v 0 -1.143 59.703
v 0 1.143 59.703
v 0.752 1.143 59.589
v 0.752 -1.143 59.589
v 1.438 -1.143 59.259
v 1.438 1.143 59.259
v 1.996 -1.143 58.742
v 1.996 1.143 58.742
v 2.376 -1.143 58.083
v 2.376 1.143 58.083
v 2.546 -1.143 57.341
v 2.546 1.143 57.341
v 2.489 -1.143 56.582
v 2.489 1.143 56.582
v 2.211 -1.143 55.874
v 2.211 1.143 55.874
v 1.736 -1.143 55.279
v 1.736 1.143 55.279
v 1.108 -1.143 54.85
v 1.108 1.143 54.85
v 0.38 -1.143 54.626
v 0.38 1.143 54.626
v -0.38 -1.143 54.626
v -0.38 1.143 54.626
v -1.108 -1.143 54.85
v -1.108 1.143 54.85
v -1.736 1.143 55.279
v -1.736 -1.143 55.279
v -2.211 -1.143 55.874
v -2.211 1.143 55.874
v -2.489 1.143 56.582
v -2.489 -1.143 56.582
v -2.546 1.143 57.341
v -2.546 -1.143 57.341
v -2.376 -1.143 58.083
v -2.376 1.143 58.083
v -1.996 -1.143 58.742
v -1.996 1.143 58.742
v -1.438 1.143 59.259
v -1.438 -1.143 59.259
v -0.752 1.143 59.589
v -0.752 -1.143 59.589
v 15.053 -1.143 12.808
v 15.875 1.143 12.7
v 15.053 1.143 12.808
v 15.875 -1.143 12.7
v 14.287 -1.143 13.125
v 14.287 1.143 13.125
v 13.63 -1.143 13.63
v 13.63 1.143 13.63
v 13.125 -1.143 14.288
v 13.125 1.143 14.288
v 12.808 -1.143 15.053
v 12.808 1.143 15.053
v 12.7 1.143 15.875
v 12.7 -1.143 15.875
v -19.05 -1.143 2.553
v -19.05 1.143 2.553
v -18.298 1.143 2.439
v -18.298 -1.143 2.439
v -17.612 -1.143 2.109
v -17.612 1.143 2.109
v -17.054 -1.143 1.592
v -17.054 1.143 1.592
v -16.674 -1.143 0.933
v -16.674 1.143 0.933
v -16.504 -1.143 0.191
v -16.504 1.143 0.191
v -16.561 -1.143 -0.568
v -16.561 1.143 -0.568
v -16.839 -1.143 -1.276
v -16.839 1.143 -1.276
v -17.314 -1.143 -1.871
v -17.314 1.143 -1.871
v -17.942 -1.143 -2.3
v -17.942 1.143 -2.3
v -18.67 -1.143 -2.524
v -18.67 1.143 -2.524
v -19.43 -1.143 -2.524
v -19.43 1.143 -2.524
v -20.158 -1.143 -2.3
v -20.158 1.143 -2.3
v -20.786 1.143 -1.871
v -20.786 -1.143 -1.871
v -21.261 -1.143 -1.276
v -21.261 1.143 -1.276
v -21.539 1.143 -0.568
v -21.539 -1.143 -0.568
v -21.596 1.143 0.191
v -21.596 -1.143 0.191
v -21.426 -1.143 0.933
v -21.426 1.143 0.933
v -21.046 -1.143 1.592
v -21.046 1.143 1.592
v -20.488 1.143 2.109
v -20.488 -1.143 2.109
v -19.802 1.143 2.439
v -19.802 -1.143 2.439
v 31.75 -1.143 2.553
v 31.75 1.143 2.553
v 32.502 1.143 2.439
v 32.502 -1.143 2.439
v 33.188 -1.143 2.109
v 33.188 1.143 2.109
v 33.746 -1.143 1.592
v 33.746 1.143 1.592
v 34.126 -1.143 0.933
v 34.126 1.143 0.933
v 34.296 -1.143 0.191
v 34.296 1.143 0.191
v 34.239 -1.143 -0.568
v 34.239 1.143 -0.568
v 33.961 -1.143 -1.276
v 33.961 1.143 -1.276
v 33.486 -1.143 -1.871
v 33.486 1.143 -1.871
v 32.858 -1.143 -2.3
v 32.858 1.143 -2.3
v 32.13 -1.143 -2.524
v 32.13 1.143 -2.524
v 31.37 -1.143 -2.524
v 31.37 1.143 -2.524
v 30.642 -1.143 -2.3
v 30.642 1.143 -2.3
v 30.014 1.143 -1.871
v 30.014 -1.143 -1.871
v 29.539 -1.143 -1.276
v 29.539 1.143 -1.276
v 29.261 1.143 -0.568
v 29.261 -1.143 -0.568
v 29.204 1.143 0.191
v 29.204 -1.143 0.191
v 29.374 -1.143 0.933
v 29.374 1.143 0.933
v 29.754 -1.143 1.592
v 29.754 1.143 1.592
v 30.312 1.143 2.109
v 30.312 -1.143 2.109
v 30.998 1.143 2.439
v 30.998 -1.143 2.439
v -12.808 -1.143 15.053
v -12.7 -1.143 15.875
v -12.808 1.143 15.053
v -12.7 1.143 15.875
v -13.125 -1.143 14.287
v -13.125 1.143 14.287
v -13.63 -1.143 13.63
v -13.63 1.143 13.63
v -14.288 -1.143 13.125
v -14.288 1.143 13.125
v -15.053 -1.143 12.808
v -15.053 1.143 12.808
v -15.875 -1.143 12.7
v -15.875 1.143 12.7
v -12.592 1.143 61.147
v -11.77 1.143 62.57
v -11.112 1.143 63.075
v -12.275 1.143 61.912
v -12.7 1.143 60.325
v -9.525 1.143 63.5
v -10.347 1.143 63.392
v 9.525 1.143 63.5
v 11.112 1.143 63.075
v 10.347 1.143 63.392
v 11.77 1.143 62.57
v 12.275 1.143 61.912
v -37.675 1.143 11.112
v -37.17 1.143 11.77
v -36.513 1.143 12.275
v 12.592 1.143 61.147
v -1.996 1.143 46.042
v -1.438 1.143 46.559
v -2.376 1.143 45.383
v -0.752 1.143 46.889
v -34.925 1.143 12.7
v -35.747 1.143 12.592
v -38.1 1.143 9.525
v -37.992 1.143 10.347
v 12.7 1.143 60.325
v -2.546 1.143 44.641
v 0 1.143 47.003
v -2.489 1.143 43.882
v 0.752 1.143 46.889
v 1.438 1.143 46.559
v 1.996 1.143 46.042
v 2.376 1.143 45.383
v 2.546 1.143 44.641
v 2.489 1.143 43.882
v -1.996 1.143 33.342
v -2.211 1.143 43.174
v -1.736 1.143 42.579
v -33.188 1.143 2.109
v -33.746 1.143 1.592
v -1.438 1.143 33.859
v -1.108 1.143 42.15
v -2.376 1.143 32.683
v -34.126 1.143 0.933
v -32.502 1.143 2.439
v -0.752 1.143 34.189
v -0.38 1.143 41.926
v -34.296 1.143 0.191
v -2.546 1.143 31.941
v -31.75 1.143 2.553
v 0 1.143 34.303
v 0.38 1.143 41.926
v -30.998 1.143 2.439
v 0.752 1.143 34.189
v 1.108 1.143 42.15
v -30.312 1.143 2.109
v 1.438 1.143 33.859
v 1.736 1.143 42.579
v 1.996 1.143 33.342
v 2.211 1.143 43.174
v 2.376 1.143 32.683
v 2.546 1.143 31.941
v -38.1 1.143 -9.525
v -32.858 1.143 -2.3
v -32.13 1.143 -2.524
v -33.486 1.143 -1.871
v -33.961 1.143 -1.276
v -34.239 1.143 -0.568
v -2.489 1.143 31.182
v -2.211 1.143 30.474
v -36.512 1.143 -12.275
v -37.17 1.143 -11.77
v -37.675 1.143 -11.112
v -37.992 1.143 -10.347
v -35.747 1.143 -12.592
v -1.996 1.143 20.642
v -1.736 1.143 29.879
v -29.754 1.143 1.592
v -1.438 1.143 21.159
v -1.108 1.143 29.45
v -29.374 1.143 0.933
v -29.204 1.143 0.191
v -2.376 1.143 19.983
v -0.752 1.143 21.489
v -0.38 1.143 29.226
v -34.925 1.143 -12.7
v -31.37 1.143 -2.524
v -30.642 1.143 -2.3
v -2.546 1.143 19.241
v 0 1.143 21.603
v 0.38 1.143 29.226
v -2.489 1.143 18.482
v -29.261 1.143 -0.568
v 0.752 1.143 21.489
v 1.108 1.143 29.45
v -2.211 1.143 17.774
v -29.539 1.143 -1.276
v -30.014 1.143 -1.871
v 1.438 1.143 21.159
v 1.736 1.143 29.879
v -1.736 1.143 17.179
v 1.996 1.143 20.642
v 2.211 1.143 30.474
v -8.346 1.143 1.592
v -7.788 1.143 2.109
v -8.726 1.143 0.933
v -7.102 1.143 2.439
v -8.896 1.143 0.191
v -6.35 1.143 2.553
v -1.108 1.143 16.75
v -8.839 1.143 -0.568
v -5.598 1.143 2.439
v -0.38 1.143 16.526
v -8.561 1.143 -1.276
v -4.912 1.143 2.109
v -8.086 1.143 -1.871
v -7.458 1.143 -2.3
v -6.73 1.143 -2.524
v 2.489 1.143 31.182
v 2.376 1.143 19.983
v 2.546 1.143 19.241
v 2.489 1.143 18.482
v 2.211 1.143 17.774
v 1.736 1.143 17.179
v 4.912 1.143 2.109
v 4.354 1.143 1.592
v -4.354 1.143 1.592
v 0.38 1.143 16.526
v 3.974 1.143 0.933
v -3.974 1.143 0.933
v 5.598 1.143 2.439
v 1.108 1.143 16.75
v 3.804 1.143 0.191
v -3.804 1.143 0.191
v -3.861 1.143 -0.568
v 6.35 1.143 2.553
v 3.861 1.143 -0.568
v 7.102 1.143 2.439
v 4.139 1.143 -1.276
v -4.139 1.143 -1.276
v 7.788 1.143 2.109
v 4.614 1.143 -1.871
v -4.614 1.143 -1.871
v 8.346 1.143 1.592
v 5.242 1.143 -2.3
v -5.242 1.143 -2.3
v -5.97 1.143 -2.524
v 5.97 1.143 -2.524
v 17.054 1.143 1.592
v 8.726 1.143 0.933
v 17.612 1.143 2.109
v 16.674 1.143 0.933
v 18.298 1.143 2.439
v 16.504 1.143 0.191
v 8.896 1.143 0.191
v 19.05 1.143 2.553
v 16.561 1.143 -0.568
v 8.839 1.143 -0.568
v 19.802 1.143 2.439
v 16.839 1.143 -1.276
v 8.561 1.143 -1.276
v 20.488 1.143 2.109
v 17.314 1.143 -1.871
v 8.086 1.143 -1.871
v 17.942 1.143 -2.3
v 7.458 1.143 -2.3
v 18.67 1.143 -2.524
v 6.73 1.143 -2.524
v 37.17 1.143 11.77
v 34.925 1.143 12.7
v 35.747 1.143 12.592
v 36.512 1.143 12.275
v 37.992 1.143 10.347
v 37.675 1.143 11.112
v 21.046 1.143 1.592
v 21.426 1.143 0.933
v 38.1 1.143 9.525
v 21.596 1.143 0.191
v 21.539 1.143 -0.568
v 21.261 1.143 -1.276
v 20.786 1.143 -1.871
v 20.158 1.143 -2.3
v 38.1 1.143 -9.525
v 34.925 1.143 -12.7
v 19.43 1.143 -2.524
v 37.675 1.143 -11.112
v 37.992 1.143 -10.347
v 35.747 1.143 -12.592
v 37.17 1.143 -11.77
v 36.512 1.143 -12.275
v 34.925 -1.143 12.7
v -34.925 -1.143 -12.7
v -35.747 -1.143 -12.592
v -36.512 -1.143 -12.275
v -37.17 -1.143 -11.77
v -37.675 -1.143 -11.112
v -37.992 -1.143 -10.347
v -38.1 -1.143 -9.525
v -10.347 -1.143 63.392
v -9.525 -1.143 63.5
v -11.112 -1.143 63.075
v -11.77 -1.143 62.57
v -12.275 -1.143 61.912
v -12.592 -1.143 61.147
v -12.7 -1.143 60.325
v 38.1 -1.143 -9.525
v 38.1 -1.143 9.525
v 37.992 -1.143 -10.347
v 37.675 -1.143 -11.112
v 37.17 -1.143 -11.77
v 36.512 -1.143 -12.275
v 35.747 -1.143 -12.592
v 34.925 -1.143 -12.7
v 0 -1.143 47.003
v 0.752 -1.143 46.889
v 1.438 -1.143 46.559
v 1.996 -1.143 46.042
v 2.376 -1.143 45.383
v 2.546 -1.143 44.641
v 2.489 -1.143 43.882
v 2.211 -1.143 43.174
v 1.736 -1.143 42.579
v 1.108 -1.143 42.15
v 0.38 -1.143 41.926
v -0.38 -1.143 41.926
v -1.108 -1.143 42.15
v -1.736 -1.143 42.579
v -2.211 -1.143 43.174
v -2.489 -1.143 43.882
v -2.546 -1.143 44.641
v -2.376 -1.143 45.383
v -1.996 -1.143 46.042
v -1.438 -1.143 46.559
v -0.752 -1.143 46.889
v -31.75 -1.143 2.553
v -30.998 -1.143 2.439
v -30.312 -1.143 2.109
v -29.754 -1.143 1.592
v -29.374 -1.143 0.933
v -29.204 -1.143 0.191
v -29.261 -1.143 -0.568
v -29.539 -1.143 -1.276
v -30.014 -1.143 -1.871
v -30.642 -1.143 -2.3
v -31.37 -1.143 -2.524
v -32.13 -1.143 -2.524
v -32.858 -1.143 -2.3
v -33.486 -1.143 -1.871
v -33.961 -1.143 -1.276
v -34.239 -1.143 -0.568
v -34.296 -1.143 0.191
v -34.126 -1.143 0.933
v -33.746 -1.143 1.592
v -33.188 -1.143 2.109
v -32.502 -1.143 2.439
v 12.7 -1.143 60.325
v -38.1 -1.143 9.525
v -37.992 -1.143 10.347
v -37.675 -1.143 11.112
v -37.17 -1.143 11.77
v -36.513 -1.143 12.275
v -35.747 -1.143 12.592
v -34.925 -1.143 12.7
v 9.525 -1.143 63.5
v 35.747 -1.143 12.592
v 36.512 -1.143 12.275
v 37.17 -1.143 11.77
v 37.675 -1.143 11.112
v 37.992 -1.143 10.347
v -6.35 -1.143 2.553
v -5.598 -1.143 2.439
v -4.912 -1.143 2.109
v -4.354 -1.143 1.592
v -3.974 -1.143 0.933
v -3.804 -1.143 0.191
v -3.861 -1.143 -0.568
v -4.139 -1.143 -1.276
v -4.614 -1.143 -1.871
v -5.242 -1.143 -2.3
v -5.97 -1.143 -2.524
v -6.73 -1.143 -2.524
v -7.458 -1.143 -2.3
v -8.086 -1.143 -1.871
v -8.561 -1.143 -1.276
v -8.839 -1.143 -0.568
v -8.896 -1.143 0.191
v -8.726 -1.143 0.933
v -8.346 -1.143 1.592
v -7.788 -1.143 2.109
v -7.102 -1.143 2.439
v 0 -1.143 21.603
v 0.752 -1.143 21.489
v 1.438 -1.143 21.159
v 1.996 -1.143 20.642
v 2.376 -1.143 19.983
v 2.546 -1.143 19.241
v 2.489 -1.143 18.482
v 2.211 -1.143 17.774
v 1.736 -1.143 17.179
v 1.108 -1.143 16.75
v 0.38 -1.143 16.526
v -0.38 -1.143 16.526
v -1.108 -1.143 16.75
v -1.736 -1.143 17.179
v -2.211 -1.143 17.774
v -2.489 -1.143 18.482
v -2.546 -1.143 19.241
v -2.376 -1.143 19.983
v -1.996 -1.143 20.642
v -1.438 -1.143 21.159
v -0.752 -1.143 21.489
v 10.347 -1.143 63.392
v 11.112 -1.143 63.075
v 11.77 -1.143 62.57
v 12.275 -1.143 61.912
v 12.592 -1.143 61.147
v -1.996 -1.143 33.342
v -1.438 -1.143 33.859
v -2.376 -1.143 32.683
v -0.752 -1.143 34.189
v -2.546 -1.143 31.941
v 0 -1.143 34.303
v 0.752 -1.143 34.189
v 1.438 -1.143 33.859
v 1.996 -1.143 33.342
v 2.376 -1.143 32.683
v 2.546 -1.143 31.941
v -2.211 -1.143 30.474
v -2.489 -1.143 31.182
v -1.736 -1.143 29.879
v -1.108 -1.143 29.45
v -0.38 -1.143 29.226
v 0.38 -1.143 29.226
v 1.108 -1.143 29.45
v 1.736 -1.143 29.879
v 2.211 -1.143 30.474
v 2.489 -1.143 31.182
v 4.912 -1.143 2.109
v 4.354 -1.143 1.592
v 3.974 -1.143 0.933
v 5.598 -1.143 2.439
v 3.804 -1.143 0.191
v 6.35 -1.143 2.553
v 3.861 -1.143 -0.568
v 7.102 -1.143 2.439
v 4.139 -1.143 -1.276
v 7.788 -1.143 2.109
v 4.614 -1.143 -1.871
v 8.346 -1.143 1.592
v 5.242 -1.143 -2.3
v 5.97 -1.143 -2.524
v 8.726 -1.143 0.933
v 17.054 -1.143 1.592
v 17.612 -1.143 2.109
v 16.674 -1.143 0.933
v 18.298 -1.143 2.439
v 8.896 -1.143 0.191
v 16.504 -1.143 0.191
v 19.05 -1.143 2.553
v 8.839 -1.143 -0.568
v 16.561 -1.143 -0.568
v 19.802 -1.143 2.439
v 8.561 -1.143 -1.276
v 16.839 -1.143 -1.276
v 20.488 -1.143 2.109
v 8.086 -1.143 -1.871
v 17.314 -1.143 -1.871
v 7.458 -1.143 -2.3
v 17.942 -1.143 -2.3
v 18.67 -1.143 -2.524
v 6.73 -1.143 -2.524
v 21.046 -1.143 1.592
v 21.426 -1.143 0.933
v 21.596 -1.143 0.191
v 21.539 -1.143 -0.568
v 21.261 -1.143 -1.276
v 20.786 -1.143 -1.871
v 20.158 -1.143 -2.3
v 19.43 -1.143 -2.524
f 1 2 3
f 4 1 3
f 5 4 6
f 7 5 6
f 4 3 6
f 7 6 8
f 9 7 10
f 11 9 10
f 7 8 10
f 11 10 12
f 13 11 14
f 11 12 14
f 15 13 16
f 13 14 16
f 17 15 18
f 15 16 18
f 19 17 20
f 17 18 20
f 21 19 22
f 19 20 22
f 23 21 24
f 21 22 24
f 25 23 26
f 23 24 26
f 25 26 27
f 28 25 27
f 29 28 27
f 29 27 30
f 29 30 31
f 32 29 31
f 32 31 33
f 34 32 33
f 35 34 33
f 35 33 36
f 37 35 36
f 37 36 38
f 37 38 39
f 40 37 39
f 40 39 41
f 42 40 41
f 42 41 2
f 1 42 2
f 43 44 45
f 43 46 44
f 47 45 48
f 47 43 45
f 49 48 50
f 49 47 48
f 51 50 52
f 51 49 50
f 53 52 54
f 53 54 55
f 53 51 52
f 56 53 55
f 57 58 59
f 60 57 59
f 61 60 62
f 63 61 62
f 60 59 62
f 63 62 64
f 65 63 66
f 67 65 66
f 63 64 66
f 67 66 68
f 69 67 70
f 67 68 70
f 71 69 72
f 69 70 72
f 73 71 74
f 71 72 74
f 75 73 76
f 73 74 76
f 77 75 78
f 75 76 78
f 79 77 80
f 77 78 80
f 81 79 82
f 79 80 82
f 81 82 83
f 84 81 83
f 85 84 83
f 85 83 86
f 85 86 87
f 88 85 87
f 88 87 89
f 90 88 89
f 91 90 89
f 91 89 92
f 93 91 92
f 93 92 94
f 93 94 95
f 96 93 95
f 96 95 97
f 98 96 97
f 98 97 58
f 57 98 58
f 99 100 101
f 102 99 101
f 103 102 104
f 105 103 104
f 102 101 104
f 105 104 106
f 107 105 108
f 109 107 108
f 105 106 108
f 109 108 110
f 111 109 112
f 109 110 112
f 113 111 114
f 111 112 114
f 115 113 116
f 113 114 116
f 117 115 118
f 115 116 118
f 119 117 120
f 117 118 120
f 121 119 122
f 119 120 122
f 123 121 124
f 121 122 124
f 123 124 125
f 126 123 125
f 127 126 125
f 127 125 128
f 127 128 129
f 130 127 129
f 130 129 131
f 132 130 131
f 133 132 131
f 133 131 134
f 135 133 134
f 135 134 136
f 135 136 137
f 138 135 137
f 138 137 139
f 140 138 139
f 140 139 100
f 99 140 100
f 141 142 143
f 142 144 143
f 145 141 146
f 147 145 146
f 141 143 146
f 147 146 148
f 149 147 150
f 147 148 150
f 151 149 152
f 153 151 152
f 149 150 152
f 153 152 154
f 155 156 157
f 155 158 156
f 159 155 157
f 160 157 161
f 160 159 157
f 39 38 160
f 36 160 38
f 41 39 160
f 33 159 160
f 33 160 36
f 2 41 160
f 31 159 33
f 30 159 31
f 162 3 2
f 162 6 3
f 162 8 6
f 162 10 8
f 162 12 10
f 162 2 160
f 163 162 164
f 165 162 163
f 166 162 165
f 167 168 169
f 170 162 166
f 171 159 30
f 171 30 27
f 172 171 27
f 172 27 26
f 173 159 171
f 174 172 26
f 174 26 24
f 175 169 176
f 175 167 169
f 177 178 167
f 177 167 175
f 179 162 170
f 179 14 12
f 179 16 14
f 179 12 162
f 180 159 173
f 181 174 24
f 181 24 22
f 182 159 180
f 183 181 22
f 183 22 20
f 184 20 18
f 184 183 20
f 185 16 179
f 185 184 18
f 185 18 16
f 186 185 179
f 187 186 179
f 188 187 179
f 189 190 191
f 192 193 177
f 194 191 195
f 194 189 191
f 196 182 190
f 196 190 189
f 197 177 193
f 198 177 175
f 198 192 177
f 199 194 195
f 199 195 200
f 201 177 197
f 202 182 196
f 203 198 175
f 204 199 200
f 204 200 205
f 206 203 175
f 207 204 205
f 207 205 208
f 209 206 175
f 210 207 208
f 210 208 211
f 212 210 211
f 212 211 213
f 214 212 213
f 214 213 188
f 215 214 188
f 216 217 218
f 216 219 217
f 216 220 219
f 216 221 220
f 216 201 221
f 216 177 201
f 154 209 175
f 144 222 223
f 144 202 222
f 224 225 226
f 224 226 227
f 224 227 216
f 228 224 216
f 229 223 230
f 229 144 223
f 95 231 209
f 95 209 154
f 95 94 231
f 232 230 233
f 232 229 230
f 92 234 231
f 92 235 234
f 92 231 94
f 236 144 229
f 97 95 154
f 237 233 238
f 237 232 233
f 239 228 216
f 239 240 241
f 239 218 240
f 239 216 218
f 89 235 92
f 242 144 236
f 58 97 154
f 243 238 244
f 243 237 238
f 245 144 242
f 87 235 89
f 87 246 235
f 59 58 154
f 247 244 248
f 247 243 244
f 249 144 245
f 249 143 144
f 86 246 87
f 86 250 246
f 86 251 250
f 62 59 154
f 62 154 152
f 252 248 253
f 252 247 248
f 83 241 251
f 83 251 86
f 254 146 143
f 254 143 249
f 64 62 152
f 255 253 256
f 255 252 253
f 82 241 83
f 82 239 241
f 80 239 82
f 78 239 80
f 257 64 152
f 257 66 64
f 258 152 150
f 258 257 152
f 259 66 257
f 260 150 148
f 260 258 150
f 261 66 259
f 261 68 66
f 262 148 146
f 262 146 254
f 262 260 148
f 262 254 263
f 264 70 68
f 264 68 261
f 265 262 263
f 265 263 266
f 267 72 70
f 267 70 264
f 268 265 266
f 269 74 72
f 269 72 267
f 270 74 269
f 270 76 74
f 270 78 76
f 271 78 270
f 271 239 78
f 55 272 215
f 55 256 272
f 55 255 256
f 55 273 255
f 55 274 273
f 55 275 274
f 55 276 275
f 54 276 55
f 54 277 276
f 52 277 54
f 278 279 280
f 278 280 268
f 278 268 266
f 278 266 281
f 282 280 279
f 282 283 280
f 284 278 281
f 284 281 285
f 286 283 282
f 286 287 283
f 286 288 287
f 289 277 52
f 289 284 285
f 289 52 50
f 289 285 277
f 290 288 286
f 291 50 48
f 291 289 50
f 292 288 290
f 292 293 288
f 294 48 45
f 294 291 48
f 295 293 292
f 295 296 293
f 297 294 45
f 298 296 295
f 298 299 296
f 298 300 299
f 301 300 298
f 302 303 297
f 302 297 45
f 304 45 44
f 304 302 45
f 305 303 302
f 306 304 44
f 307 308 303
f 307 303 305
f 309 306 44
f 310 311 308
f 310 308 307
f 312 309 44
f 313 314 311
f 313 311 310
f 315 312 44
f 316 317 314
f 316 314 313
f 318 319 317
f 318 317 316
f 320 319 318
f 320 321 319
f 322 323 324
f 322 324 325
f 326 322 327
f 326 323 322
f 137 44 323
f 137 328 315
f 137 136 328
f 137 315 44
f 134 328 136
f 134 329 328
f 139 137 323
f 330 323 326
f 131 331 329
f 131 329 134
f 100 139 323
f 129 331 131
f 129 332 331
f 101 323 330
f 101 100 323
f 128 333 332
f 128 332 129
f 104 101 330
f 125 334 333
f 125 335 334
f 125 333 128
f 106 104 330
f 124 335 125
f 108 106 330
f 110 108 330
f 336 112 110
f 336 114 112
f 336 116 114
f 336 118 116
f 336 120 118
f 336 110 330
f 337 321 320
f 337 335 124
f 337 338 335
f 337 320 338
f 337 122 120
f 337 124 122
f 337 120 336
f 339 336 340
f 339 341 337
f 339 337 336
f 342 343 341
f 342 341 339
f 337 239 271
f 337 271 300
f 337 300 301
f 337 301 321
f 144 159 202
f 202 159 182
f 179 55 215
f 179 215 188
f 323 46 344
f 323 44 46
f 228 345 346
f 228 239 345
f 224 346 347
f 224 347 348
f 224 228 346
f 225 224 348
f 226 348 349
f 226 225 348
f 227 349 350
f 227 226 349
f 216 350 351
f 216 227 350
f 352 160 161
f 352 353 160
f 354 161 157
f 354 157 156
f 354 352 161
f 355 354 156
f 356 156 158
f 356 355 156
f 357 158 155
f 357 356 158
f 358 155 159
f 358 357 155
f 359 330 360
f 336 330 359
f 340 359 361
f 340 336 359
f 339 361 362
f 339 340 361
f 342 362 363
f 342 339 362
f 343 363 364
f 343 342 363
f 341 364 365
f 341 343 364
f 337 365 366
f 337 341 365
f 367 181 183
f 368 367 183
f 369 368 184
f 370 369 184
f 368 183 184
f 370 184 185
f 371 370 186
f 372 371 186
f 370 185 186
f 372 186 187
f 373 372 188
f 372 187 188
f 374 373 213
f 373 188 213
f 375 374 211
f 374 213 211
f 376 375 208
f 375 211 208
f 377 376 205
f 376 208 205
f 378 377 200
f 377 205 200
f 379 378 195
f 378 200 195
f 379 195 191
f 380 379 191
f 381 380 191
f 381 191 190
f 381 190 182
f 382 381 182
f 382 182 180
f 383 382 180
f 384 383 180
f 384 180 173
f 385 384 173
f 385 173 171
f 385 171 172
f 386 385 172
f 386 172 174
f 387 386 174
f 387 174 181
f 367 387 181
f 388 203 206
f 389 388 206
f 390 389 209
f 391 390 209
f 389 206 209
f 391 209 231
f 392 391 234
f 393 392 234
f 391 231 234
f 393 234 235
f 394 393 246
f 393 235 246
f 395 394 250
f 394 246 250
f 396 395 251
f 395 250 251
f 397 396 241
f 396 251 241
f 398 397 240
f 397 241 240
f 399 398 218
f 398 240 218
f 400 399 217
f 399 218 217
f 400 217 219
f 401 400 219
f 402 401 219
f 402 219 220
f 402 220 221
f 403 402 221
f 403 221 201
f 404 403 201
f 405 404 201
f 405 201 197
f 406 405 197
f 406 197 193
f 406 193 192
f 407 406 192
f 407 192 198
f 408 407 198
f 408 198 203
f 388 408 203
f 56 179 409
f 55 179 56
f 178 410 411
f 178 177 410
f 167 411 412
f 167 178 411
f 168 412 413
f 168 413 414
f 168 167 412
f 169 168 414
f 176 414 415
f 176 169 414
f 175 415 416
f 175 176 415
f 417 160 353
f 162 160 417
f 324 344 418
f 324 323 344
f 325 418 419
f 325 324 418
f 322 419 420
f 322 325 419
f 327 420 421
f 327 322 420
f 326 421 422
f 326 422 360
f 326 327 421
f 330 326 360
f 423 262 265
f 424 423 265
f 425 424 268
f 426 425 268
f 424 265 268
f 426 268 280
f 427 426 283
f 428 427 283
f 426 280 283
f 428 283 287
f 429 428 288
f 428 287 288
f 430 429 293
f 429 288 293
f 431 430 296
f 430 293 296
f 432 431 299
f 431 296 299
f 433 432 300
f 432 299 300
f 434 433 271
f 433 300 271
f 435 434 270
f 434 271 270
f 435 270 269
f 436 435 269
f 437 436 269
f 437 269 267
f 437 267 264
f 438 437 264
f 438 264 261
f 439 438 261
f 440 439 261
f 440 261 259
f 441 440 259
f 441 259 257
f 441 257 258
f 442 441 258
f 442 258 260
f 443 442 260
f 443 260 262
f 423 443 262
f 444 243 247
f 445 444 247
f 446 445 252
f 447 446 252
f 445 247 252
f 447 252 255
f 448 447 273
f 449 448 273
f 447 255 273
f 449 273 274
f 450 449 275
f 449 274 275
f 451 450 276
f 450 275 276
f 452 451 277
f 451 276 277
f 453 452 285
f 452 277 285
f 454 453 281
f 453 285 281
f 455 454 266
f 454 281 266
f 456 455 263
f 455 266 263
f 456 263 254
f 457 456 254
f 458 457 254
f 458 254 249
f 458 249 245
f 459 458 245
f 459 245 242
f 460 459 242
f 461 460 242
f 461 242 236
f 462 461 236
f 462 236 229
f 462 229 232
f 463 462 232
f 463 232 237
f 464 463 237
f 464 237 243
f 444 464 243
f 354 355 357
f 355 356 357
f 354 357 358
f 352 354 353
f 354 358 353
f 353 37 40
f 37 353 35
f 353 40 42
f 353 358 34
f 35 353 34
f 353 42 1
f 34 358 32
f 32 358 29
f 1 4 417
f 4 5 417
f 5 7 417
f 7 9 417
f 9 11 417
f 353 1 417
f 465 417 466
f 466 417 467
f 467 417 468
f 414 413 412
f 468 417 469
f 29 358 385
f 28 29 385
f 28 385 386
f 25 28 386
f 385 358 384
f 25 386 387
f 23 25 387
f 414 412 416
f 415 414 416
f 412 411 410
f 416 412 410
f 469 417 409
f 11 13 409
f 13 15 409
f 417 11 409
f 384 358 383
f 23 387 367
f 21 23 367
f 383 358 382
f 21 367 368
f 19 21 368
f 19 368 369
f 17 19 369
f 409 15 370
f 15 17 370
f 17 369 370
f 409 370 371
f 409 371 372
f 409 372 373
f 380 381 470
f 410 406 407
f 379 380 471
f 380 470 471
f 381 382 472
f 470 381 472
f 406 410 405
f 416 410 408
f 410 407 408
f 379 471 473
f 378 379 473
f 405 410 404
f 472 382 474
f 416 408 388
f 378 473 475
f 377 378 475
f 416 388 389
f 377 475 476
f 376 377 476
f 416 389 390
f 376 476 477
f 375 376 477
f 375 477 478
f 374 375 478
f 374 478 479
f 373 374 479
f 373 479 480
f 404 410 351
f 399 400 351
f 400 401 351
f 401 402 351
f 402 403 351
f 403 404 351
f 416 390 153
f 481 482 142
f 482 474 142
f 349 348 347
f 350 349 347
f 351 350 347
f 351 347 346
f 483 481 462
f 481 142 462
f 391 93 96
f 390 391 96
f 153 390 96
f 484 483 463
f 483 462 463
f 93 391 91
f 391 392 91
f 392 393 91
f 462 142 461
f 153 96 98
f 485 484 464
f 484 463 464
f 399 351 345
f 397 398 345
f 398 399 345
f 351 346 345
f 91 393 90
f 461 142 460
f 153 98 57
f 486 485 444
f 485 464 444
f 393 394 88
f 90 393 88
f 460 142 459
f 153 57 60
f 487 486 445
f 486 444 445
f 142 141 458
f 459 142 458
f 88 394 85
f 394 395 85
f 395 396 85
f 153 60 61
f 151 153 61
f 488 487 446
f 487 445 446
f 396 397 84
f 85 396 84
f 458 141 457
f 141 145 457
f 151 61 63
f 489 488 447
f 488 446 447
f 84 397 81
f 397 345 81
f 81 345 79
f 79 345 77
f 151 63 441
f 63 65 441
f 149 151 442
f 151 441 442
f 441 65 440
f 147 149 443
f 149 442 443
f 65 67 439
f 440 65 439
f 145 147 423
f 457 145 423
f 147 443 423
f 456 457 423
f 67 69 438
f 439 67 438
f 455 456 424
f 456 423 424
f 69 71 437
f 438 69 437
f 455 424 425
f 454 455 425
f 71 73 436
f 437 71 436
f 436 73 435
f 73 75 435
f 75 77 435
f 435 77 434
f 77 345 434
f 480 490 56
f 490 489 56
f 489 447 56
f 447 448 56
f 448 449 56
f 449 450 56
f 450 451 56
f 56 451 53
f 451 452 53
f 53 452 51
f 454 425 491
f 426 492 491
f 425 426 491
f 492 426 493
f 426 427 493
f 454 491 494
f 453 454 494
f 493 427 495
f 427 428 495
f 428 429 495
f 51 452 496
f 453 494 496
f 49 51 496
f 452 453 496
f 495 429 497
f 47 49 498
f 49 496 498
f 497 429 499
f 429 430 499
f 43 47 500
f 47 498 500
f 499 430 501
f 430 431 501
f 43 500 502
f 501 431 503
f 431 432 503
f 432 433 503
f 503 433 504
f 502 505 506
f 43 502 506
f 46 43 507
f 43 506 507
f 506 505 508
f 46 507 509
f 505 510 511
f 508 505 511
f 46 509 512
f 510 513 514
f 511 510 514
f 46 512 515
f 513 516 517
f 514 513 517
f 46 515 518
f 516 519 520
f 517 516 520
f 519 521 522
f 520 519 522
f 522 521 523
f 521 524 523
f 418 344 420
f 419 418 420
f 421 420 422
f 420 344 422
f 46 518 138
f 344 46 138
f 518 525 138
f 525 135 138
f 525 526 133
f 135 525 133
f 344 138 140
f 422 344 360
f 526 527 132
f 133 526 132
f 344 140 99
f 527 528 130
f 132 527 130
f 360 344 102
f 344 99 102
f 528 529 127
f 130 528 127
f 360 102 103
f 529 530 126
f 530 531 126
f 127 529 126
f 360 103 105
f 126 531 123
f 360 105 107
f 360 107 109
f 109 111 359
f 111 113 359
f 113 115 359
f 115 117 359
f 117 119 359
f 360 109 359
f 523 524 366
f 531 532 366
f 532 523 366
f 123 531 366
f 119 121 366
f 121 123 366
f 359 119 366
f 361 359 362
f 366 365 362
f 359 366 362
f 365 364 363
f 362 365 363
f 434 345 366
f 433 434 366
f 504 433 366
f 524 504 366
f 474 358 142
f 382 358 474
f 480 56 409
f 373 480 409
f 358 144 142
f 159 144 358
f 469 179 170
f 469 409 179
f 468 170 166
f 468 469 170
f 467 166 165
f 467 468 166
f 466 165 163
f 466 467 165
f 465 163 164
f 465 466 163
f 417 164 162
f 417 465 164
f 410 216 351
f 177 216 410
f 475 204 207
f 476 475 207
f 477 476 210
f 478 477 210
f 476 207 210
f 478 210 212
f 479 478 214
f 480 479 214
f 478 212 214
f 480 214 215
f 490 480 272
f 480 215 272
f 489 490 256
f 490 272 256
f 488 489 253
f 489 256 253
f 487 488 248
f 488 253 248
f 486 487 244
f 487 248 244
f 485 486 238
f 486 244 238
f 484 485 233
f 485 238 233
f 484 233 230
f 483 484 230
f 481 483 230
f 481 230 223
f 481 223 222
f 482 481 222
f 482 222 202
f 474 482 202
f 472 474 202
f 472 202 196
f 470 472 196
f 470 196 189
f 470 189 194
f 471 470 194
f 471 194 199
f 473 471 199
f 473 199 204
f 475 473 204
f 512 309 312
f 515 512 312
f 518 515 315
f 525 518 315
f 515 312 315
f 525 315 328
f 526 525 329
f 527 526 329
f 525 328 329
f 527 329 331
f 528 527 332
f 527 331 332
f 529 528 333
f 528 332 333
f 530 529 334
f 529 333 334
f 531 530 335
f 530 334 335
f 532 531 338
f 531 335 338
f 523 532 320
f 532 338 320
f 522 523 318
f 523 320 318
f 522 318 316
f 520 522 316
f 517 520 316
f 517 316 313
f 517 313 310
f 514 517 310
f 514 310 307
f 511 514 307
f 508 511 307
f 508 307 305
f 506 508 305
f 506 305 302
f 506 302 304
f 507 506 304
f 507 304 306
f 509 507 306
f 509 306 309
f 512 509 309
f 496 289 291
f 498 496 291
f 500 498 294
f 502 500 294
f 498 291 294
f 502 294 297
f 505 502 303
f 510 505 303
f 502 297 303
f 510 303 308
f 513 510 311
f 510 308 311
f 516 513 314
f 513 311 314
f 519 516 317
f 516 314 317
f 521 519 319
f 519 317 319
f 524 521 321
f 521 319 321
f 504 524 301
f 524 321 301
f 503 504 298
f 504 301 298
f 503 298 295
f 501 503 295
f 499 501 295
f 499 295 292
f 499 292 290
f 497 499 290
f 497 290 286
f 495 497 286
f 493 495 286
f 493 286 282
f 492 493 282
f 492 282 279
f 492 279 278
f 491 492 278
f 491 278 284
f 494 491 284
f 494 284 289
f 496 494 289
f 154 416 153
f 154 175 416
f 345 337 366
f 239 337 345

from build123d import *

# Parameters (mm, degrees)
BOSS_EXTRUDE1_DEPTH = 1.143
SKETCH2_R           = 2.5527
CUT_EXTRUDE1_DEPTH  = 75.088364782
FILLET1_R           = 3.175


with BuildPart() as part:
    # Sketch1 → Boss-Extrude1 (new, symmetric)
    with BuildSketch(Plane(origin=(0, 0, 0), x_dir=(1, 0, 0), z_dir=(0, 1, 0))):
        Polygon((12.7, -12.7), (38.1, -12.7), (38.1, 12.7), (-38.1, 12.7), (-38.1, -12.7), (-12.7, -12.7), (-12.7, -63.5), (12.7, -63.5), align=None)
    extrude(amount=BOSS_EXTRUDE1_DEPTH, both=True)

    # Sketch2 → Cut-Extrude1 (cut, through all)
    with BuildSketch(Plane(origin=(0, 1.143, 0), x_dir=(1, 0, 0), z_dir=(0, 1, 0))):
        with Locations(Location((-31.75, 0, 0), (0, 0, 270))):
            Circle(SKETCH2_R)
        with Locations(Location((-19.05, 0, 0), (0, 0, 270))):
            Circle(SKETCH2_R)
        with Locations(Location((-6.35, 0, 0), (0, 0, 270))):
            Circle(SKETCH2_R)
        with Locations(Location((6.35, 0, 0), (0, 0, 270))):
            Circle(SKETCH2_R)
        with Locations(Location((19.05, 0, 0), (0, 0, 270))):
            Circle(SKETCH2_R)
        with Locations(Location((0, -57.15, 0), (0, 0, 270))):
            Circle(SKETCH2_R)
        with Locations(Location((31.75, 0, 0), (0, 0, 270))):
            Circle(SKETCH2_R)
        with Locations(Location((0, -44.45, 0), (0, 0, 270))):
            Circle(SKETCH2_R)
        with Locations(Location((0, -31.75, 0), (0, 0, 270))):
            Circle(SKETCH2_R)
        with Locations(Location((0, -19.05, 0), (0, 0, 270))):
            Circle(SKETCH2_R)
    extrude(amount=-CUT_EXTRUDE1_DEPTH, mode=Mode.SUBTRACT)

    # Fillet1
    fillet1_edges = [part.edges().sort_by_distance(p)[0] for p in [
        (38.1, 0, 12.7),
        (12.7, 0, 12.7),
        (12.7, 0, 63.5),
        (-12.7, 0, 63.5),
        (-12.7, 0, 12.7),
        (-38.1, 0, 12.7),
        (-38.1, 0, -12.7),
        (38.1, 0, -12.7),
    ]]
    fillet(fillet1_edges, radius=FILLET1_R)


solid = part.part
